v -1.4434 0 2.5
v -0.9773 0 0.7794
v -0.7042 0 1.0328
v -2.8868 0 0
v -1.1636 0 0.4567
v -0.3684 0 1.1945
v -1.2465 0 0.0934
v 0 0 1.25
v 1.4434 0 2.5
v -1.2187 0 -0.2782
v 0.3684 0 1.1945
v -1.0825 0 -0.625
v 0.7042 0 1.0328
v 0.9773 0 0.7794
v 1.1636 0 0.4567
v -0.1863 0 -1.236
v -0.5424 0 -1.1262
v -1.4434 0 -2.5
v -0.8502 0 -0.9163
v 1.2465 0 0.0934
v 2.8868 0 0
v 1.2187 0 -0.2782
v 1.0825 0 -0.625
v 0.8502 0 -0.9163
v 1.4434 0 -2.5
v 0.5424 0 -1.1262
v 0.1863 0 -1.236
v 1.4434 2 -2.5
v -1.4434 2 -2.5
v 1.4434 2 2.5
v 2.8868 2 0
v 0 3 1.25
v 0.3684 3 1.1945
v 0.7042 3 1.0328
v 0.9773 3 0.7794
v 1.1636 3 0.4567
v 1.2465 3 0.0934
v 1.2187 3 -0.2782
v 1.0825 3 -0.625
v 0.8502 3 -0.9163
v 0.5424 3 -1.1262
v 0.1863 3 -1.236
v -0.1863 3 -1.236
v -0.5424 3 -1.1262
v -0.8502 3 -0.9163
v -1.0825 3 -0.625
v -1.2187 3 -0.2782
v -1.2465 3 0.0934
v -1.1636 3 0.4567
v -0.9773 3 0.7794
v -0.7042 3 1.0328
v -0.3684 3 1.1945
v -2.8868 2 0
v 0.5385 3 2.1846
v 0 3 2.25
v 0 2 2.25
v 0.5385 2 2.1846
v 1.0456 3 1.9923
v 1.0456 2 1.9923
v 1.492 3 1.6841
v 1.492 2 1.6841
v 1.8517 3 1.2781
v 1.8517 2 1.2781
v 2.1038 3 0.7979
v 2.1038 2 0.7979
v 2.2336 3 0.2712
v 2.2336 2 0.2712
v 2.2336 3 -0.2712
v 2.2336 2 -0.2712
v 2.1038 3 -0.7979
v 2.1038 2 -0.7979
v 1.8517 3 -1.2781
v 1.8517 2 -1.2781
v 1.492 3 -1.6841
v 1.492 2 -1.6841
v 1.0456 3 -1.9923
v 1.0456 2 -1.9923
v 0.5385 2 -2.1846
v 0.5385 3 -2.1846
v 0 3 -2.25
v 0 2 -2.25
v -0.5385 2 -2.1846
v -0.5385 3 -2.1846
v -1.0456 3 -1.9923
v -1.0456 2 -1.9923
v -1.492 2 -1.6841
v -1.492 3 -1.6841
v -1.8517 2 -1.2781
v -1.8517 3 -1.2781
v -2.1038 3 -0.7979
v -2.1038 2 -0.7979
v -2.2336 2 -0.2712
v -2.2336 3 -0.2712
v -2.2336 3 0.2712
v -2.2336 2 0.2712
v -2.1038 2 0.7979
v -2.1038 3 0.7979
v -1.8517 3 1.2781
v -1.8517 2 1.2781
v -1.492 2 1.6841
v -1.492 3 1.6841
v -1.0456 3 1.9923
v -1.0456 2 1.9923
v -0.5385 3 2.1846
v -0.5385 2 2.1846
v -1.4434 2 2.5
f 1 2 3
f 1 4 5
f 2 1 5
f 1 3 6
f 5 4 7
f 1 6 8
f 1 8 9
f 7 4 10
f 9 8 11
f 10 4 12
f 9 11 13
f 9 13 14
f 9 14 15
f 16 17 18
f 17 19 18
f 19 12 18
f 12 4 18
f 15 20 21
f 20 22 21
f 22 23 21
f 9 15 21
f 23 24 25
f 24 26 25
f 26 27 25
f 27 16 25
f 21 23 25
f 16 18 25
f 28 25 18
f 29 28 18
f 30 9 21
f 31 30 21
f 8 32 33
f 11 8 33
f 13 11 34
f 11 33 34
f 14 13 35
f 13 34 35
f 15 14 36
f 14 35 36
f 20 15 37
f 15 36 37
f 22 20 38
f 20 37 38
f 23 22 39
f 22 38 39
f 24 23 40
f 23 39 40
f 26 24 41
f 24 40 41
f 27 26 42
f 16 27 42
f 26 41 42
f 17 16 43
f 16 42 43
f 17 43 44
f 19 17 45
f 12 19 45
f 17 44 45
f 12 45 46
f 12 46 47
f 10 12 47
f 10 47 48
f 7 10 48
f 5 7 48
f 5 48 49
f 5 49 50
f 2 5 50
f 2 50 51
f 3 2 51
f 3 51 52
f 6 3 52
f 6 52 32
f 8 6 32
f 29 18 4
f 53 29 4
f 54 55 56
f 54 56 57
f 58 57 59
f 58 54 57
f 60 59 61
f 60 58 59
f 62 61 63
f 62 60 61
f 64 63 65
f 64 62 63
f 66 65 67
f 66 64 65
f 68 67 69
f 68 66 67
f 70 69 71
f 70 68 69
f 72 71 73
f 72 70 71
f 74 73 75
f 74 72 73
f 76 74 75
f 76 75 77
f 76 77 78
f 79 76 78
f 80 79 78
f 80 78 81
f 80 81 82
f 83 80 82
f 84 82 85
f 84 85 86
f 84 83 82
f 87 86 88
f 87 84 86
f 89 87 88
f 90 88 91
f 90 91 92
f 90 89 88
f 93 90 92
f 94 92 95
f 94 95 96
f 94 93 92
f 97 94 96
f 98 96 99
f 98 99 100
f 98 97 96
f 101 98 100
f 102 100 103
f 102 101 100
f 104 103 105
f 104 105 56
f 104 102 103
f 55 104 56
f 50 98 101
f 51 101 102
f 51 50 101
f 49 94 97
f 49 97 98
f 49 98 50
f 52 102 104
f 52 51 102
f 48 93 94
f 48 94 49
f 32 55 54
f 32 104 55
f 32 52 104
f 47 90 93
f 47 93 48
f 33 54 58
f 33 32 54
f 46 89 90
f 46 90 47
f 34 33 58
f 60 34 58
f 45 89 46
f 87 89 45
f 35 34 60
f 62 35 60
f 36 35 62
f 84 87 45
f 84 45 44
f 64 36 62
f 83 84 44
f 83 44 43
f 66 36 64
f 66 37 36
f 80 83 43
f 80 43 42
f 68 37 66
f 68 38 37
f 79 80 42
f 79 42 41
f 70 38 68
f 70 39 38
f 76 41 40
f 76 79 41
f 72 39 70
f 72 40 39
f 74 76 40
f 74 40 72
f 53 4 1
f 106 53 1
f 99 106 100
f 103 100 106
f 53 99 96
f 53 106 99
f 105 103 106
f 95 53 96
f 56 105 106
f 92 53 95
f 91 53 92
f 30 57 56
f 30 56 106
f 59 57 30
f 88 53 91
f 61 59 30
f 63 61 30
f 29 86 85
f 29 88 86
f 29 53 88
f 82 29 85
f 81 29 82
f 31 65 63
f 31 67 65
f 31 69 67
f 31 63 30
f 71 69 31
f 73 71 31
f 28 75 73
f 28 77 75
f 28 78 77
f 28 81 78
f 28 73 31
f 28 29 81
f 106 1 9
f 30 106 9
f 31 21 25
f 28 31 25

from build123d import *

# Parameters (mm, degrees)
EXTRUDE_1_DEPTH     = 3
CUT_EXTRUDE_1_REACH = 6.856
SKETCH_2_R          = 1.25
SKETCH_3_OUTSIDE_W  = 9.416
SKETCH_3_OUTSIDE_H  = 8.642
SKETCH_3_OUTSIDE_R  = 2.25
CUT_EXTRUDE_2_DEPTH = 1


with BuildPart() as part:
    # 草图1 → 凸台-拉伸1 (new body)
    with BuildSketch(Plane(origin=(0, 0, 0), x_dir=(1, 0, 0), z_dir=(0, 1, 0))):
        Polygon((2.886751346, 0), (1.443375673, 2.5), (-1.443375673, 2.5), (-2.886751346, 0), (-1.443375673, -2.5), (1.443375673, -2.5), align=None)
    extrude(amount=EXTRUDE_1_DEPTH)

    # 草图2 → 切除-拉伸1 (cut, up to next)
    with BuildSketch(Plane(origin=(0, 3, 0), x_dir=(1, 0, 0), z_dir=(0, 1, 0)), mode=Mode.PRIVATE) as cut_extrude_1_sk1:
        with Locations(Location((0, 0, 0), (0, 0, 270))):
            Circle(SKETCH_2_R)
    cut_extrude_1_tool1 = extrude(cut_extrude_1_sk1.sketch, amount=-CUT_EXTRUDE_1_REACH, mode=Mode.PRIVATE) & part.part
    add(cut_extrude_1_tool1.solids().sort_by_distance((0, 3, 0))[0], mode=Mode.SUBTRACT)

    # 草图3 outside → 切除-拉伸2 (cut)
    with BuildSketch(Plane(origin=(0, 3, 0), x_dir=(1, 0, 0), z_dir=(0, 1, 0))):
        Rectangle(SKETCH_3_OUTSIDE_W, SKETCH_3_OUTSIDE_H)
        with Locations(Location((0, 0, 0), (0, 0, 270))):
            Circle(SKETCH_3_OUTSIDE_R, mode=Mode.SUBTRACT)
    extrude(amount=-CUT_EXTRUDE_2_DEPTH, mode=Mode.SUBTRACT)


solid = part.part
